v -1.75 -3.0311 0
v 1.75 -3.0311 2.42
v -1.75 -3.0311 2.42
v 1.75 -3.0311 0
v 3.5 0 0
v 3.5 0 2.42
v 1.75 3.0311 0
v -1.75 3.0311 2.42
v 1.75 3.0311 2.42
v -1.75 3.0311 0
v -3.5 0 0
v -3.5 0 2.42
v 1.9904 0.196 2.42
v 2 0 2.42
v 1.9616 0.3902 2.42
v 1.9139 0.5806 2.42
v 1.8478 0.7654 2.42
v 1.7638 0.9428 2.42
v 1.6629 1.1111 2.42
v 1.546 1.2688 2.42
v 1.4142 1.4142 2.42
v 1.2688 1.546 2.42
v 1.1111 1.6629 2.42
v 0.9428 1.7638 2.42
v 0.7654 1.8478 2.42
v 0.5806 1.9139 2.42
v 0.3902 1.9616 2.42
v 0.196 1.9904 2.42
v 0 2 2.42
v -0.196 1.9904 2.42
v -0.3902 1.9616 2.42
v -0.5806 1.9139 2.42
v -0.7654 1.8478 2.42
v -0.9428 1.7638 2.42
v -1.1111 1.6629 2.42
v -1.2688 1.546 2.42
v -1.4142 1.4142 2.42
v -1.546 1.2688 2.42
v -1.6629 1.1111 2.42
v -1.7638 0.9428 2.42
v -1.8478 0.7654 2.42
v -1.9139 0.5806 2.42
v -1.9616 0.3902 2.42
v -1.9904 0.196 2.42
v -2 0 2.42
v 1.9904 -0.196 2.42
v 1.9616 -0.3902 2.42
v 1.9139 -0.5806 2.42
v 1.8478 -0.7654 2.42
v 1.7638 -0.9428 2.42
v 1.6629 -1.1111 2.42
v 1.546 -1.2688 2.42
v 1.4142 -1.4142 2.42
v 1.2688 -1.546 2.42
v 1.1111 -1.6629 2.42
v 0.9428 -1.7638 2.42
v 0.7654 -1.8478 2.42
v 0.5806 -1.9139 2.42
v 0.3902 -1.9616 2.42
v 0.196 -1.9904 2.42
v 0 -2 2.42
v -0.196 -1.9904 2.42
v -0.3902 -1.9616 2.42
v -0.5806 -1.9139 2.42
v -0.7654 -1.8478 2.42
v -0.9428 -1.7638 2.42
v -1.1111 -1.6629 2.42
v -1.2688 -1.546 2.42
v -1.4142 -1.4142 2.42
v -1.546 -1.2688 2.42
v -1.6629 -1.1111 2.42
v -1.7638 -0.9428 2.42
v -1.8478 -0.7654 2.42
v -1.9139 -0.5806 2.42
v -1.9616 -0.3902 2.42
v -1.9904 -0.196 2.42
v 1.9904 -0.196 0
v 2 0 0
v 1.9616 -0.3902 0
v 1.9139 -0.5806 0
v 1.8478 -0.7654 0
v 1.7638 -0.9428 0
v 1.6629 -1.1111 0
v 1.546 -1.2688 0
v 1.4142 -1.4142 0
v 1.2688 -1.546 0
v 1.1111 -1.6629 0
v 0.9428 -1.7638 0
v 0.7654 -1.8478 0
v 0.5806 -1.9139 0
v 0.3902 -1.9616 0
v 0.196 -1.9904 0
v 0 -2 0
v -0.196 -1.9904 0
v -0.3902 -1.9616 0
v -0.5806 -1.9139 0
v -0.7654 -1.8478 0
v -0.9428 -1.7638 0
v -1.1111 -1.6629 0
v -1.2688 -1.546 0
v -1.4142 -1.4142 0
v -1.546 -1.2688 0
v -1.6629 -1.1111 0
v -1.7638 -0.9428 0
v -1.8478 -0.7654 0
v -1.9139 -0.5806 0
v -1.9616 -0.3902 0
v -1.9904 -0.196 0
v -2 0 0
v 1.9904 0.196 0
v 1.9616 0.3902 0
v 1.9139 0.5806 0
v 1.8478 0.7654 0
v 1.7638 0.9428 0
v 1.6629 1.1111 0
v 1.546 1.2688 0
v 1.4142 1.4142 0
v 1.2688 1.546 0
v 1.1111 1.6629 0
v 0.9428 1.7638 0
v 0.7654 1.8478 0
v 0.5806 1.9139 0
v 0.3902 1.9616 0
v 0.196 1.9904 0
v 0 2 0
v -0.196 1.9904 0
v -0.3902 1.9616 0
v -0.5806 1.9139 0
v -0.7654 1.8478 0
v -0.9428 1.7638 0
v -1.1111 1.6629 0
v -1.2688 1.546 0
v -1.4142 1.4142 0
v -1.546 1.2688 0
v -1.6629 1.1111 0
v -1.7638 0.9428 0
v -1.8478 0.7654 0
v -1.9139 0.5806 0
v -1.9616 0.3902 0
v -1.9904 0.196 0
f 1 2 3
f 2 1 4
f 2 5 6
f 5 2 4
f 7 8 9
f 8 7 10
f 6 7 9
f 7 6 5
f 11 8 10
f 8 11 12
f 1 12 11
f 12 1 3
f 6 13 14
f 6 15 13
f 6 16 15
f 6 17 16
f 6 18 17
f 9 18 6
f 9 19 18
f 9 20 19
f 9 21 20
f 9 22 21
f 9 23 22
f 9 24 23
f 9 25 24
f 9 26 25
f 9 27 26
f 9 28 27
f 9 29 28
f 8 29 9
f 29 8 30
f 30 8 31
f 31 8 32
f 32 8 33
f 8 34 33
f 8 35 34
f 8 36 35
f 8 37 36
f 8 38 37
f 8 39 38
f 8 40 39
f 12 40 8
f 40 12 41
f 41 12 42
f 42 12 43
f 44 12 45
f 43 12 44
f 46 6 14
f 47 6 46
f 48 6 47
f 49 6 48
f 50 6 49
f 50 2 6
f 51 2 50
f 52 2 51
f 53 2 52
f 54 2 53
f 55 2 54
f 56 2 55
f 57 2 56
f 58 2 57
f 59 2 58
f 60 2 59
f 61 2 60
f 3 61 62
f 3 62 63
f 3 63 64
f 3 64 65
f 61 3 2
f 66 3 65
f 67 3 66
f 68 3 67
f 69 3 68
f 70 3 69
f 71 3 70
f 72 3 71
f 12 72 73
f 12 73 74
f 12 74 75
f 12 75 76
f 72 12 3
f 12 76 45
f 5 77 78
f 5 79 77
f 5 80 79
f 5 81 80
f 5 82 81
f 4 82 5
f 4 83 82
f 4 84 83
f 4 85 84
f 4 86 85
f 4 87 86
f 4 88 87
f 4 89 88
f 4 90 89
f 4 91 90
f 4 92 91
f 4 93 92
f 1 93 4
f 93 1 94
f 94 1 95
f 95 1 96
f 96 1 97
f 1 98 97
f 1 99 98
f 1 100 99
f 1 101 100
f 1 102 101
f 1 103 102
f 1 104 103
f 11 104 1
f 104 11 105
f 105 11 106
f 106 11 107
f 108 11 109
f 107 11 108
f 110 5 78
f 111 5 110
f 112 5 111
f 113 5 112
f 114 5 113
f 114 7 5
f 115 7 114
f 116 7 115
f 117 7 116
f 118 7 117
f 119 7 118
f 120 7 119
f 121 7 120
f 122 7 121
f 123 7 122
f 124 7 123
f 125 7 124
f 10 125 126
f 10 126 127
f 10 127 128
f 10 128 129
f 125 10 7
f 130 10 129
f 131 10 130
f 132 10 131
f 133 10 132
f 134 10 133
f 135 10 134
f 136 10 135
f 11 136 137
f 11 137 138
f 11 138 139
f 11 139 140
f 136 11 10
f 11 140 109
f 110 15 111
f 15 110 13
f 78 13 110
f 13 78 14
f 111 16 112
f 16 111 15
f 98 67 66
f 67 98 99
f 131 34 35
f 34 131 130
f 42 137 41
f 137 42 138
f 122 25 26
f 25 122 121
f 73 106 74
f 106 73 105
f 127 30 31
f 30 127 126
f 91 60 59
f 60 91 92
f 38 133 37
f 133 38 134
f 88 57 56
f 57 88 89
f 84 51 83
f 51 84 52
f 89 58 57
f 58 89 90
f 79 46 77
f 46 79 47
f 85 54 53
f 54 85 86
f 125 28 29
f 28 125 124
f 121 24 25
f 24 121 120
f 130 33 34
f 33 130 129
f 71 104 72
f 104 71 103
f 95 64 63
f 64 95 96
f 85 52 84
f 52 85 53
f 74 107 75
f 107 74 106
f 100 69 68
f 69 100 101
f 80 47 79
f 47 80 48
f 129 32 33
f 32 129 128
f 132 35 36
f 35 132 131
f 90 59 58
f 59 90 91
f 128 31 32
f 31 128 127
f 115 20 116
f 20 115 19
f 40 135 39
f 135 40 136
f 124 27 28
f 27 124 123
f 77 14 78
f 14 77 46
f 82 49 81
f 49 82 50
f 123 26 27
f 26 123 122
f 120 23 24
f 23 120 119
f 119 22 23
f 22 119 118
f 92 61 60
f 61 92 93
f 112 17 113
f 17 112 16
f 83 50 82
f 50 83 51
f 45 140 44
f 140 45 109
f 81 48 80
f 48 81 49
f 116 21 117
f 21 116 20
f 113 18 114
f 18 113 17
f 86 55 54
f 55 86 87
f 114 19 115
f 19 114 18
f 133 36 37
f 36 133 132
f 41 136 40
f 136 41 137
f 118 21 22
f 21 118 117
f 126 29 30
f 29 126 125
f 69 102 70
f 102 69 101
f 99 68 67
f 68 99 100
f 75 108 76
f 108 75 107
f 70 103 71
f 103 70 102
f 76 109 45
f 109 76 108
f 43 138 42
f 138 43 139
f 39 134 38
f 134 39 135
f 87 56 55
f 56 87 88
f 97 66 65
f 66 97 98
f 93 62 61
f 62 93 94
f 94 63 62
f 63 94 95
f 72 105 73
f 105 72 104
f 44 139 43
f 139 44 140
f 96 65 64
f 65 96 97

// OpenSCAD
module hex_nut() {
    difference() {
        // Hexagon shape
        scale([1, 1, 2.2/2]) 
            cylinder(d=7.0, h=2.2, $fn=6);
        // Hole for the screw
        translate([0, 0, -1])
            cylinder(d=4.0, h=4.2, $fn=64);
    }
}

hex_nut();
